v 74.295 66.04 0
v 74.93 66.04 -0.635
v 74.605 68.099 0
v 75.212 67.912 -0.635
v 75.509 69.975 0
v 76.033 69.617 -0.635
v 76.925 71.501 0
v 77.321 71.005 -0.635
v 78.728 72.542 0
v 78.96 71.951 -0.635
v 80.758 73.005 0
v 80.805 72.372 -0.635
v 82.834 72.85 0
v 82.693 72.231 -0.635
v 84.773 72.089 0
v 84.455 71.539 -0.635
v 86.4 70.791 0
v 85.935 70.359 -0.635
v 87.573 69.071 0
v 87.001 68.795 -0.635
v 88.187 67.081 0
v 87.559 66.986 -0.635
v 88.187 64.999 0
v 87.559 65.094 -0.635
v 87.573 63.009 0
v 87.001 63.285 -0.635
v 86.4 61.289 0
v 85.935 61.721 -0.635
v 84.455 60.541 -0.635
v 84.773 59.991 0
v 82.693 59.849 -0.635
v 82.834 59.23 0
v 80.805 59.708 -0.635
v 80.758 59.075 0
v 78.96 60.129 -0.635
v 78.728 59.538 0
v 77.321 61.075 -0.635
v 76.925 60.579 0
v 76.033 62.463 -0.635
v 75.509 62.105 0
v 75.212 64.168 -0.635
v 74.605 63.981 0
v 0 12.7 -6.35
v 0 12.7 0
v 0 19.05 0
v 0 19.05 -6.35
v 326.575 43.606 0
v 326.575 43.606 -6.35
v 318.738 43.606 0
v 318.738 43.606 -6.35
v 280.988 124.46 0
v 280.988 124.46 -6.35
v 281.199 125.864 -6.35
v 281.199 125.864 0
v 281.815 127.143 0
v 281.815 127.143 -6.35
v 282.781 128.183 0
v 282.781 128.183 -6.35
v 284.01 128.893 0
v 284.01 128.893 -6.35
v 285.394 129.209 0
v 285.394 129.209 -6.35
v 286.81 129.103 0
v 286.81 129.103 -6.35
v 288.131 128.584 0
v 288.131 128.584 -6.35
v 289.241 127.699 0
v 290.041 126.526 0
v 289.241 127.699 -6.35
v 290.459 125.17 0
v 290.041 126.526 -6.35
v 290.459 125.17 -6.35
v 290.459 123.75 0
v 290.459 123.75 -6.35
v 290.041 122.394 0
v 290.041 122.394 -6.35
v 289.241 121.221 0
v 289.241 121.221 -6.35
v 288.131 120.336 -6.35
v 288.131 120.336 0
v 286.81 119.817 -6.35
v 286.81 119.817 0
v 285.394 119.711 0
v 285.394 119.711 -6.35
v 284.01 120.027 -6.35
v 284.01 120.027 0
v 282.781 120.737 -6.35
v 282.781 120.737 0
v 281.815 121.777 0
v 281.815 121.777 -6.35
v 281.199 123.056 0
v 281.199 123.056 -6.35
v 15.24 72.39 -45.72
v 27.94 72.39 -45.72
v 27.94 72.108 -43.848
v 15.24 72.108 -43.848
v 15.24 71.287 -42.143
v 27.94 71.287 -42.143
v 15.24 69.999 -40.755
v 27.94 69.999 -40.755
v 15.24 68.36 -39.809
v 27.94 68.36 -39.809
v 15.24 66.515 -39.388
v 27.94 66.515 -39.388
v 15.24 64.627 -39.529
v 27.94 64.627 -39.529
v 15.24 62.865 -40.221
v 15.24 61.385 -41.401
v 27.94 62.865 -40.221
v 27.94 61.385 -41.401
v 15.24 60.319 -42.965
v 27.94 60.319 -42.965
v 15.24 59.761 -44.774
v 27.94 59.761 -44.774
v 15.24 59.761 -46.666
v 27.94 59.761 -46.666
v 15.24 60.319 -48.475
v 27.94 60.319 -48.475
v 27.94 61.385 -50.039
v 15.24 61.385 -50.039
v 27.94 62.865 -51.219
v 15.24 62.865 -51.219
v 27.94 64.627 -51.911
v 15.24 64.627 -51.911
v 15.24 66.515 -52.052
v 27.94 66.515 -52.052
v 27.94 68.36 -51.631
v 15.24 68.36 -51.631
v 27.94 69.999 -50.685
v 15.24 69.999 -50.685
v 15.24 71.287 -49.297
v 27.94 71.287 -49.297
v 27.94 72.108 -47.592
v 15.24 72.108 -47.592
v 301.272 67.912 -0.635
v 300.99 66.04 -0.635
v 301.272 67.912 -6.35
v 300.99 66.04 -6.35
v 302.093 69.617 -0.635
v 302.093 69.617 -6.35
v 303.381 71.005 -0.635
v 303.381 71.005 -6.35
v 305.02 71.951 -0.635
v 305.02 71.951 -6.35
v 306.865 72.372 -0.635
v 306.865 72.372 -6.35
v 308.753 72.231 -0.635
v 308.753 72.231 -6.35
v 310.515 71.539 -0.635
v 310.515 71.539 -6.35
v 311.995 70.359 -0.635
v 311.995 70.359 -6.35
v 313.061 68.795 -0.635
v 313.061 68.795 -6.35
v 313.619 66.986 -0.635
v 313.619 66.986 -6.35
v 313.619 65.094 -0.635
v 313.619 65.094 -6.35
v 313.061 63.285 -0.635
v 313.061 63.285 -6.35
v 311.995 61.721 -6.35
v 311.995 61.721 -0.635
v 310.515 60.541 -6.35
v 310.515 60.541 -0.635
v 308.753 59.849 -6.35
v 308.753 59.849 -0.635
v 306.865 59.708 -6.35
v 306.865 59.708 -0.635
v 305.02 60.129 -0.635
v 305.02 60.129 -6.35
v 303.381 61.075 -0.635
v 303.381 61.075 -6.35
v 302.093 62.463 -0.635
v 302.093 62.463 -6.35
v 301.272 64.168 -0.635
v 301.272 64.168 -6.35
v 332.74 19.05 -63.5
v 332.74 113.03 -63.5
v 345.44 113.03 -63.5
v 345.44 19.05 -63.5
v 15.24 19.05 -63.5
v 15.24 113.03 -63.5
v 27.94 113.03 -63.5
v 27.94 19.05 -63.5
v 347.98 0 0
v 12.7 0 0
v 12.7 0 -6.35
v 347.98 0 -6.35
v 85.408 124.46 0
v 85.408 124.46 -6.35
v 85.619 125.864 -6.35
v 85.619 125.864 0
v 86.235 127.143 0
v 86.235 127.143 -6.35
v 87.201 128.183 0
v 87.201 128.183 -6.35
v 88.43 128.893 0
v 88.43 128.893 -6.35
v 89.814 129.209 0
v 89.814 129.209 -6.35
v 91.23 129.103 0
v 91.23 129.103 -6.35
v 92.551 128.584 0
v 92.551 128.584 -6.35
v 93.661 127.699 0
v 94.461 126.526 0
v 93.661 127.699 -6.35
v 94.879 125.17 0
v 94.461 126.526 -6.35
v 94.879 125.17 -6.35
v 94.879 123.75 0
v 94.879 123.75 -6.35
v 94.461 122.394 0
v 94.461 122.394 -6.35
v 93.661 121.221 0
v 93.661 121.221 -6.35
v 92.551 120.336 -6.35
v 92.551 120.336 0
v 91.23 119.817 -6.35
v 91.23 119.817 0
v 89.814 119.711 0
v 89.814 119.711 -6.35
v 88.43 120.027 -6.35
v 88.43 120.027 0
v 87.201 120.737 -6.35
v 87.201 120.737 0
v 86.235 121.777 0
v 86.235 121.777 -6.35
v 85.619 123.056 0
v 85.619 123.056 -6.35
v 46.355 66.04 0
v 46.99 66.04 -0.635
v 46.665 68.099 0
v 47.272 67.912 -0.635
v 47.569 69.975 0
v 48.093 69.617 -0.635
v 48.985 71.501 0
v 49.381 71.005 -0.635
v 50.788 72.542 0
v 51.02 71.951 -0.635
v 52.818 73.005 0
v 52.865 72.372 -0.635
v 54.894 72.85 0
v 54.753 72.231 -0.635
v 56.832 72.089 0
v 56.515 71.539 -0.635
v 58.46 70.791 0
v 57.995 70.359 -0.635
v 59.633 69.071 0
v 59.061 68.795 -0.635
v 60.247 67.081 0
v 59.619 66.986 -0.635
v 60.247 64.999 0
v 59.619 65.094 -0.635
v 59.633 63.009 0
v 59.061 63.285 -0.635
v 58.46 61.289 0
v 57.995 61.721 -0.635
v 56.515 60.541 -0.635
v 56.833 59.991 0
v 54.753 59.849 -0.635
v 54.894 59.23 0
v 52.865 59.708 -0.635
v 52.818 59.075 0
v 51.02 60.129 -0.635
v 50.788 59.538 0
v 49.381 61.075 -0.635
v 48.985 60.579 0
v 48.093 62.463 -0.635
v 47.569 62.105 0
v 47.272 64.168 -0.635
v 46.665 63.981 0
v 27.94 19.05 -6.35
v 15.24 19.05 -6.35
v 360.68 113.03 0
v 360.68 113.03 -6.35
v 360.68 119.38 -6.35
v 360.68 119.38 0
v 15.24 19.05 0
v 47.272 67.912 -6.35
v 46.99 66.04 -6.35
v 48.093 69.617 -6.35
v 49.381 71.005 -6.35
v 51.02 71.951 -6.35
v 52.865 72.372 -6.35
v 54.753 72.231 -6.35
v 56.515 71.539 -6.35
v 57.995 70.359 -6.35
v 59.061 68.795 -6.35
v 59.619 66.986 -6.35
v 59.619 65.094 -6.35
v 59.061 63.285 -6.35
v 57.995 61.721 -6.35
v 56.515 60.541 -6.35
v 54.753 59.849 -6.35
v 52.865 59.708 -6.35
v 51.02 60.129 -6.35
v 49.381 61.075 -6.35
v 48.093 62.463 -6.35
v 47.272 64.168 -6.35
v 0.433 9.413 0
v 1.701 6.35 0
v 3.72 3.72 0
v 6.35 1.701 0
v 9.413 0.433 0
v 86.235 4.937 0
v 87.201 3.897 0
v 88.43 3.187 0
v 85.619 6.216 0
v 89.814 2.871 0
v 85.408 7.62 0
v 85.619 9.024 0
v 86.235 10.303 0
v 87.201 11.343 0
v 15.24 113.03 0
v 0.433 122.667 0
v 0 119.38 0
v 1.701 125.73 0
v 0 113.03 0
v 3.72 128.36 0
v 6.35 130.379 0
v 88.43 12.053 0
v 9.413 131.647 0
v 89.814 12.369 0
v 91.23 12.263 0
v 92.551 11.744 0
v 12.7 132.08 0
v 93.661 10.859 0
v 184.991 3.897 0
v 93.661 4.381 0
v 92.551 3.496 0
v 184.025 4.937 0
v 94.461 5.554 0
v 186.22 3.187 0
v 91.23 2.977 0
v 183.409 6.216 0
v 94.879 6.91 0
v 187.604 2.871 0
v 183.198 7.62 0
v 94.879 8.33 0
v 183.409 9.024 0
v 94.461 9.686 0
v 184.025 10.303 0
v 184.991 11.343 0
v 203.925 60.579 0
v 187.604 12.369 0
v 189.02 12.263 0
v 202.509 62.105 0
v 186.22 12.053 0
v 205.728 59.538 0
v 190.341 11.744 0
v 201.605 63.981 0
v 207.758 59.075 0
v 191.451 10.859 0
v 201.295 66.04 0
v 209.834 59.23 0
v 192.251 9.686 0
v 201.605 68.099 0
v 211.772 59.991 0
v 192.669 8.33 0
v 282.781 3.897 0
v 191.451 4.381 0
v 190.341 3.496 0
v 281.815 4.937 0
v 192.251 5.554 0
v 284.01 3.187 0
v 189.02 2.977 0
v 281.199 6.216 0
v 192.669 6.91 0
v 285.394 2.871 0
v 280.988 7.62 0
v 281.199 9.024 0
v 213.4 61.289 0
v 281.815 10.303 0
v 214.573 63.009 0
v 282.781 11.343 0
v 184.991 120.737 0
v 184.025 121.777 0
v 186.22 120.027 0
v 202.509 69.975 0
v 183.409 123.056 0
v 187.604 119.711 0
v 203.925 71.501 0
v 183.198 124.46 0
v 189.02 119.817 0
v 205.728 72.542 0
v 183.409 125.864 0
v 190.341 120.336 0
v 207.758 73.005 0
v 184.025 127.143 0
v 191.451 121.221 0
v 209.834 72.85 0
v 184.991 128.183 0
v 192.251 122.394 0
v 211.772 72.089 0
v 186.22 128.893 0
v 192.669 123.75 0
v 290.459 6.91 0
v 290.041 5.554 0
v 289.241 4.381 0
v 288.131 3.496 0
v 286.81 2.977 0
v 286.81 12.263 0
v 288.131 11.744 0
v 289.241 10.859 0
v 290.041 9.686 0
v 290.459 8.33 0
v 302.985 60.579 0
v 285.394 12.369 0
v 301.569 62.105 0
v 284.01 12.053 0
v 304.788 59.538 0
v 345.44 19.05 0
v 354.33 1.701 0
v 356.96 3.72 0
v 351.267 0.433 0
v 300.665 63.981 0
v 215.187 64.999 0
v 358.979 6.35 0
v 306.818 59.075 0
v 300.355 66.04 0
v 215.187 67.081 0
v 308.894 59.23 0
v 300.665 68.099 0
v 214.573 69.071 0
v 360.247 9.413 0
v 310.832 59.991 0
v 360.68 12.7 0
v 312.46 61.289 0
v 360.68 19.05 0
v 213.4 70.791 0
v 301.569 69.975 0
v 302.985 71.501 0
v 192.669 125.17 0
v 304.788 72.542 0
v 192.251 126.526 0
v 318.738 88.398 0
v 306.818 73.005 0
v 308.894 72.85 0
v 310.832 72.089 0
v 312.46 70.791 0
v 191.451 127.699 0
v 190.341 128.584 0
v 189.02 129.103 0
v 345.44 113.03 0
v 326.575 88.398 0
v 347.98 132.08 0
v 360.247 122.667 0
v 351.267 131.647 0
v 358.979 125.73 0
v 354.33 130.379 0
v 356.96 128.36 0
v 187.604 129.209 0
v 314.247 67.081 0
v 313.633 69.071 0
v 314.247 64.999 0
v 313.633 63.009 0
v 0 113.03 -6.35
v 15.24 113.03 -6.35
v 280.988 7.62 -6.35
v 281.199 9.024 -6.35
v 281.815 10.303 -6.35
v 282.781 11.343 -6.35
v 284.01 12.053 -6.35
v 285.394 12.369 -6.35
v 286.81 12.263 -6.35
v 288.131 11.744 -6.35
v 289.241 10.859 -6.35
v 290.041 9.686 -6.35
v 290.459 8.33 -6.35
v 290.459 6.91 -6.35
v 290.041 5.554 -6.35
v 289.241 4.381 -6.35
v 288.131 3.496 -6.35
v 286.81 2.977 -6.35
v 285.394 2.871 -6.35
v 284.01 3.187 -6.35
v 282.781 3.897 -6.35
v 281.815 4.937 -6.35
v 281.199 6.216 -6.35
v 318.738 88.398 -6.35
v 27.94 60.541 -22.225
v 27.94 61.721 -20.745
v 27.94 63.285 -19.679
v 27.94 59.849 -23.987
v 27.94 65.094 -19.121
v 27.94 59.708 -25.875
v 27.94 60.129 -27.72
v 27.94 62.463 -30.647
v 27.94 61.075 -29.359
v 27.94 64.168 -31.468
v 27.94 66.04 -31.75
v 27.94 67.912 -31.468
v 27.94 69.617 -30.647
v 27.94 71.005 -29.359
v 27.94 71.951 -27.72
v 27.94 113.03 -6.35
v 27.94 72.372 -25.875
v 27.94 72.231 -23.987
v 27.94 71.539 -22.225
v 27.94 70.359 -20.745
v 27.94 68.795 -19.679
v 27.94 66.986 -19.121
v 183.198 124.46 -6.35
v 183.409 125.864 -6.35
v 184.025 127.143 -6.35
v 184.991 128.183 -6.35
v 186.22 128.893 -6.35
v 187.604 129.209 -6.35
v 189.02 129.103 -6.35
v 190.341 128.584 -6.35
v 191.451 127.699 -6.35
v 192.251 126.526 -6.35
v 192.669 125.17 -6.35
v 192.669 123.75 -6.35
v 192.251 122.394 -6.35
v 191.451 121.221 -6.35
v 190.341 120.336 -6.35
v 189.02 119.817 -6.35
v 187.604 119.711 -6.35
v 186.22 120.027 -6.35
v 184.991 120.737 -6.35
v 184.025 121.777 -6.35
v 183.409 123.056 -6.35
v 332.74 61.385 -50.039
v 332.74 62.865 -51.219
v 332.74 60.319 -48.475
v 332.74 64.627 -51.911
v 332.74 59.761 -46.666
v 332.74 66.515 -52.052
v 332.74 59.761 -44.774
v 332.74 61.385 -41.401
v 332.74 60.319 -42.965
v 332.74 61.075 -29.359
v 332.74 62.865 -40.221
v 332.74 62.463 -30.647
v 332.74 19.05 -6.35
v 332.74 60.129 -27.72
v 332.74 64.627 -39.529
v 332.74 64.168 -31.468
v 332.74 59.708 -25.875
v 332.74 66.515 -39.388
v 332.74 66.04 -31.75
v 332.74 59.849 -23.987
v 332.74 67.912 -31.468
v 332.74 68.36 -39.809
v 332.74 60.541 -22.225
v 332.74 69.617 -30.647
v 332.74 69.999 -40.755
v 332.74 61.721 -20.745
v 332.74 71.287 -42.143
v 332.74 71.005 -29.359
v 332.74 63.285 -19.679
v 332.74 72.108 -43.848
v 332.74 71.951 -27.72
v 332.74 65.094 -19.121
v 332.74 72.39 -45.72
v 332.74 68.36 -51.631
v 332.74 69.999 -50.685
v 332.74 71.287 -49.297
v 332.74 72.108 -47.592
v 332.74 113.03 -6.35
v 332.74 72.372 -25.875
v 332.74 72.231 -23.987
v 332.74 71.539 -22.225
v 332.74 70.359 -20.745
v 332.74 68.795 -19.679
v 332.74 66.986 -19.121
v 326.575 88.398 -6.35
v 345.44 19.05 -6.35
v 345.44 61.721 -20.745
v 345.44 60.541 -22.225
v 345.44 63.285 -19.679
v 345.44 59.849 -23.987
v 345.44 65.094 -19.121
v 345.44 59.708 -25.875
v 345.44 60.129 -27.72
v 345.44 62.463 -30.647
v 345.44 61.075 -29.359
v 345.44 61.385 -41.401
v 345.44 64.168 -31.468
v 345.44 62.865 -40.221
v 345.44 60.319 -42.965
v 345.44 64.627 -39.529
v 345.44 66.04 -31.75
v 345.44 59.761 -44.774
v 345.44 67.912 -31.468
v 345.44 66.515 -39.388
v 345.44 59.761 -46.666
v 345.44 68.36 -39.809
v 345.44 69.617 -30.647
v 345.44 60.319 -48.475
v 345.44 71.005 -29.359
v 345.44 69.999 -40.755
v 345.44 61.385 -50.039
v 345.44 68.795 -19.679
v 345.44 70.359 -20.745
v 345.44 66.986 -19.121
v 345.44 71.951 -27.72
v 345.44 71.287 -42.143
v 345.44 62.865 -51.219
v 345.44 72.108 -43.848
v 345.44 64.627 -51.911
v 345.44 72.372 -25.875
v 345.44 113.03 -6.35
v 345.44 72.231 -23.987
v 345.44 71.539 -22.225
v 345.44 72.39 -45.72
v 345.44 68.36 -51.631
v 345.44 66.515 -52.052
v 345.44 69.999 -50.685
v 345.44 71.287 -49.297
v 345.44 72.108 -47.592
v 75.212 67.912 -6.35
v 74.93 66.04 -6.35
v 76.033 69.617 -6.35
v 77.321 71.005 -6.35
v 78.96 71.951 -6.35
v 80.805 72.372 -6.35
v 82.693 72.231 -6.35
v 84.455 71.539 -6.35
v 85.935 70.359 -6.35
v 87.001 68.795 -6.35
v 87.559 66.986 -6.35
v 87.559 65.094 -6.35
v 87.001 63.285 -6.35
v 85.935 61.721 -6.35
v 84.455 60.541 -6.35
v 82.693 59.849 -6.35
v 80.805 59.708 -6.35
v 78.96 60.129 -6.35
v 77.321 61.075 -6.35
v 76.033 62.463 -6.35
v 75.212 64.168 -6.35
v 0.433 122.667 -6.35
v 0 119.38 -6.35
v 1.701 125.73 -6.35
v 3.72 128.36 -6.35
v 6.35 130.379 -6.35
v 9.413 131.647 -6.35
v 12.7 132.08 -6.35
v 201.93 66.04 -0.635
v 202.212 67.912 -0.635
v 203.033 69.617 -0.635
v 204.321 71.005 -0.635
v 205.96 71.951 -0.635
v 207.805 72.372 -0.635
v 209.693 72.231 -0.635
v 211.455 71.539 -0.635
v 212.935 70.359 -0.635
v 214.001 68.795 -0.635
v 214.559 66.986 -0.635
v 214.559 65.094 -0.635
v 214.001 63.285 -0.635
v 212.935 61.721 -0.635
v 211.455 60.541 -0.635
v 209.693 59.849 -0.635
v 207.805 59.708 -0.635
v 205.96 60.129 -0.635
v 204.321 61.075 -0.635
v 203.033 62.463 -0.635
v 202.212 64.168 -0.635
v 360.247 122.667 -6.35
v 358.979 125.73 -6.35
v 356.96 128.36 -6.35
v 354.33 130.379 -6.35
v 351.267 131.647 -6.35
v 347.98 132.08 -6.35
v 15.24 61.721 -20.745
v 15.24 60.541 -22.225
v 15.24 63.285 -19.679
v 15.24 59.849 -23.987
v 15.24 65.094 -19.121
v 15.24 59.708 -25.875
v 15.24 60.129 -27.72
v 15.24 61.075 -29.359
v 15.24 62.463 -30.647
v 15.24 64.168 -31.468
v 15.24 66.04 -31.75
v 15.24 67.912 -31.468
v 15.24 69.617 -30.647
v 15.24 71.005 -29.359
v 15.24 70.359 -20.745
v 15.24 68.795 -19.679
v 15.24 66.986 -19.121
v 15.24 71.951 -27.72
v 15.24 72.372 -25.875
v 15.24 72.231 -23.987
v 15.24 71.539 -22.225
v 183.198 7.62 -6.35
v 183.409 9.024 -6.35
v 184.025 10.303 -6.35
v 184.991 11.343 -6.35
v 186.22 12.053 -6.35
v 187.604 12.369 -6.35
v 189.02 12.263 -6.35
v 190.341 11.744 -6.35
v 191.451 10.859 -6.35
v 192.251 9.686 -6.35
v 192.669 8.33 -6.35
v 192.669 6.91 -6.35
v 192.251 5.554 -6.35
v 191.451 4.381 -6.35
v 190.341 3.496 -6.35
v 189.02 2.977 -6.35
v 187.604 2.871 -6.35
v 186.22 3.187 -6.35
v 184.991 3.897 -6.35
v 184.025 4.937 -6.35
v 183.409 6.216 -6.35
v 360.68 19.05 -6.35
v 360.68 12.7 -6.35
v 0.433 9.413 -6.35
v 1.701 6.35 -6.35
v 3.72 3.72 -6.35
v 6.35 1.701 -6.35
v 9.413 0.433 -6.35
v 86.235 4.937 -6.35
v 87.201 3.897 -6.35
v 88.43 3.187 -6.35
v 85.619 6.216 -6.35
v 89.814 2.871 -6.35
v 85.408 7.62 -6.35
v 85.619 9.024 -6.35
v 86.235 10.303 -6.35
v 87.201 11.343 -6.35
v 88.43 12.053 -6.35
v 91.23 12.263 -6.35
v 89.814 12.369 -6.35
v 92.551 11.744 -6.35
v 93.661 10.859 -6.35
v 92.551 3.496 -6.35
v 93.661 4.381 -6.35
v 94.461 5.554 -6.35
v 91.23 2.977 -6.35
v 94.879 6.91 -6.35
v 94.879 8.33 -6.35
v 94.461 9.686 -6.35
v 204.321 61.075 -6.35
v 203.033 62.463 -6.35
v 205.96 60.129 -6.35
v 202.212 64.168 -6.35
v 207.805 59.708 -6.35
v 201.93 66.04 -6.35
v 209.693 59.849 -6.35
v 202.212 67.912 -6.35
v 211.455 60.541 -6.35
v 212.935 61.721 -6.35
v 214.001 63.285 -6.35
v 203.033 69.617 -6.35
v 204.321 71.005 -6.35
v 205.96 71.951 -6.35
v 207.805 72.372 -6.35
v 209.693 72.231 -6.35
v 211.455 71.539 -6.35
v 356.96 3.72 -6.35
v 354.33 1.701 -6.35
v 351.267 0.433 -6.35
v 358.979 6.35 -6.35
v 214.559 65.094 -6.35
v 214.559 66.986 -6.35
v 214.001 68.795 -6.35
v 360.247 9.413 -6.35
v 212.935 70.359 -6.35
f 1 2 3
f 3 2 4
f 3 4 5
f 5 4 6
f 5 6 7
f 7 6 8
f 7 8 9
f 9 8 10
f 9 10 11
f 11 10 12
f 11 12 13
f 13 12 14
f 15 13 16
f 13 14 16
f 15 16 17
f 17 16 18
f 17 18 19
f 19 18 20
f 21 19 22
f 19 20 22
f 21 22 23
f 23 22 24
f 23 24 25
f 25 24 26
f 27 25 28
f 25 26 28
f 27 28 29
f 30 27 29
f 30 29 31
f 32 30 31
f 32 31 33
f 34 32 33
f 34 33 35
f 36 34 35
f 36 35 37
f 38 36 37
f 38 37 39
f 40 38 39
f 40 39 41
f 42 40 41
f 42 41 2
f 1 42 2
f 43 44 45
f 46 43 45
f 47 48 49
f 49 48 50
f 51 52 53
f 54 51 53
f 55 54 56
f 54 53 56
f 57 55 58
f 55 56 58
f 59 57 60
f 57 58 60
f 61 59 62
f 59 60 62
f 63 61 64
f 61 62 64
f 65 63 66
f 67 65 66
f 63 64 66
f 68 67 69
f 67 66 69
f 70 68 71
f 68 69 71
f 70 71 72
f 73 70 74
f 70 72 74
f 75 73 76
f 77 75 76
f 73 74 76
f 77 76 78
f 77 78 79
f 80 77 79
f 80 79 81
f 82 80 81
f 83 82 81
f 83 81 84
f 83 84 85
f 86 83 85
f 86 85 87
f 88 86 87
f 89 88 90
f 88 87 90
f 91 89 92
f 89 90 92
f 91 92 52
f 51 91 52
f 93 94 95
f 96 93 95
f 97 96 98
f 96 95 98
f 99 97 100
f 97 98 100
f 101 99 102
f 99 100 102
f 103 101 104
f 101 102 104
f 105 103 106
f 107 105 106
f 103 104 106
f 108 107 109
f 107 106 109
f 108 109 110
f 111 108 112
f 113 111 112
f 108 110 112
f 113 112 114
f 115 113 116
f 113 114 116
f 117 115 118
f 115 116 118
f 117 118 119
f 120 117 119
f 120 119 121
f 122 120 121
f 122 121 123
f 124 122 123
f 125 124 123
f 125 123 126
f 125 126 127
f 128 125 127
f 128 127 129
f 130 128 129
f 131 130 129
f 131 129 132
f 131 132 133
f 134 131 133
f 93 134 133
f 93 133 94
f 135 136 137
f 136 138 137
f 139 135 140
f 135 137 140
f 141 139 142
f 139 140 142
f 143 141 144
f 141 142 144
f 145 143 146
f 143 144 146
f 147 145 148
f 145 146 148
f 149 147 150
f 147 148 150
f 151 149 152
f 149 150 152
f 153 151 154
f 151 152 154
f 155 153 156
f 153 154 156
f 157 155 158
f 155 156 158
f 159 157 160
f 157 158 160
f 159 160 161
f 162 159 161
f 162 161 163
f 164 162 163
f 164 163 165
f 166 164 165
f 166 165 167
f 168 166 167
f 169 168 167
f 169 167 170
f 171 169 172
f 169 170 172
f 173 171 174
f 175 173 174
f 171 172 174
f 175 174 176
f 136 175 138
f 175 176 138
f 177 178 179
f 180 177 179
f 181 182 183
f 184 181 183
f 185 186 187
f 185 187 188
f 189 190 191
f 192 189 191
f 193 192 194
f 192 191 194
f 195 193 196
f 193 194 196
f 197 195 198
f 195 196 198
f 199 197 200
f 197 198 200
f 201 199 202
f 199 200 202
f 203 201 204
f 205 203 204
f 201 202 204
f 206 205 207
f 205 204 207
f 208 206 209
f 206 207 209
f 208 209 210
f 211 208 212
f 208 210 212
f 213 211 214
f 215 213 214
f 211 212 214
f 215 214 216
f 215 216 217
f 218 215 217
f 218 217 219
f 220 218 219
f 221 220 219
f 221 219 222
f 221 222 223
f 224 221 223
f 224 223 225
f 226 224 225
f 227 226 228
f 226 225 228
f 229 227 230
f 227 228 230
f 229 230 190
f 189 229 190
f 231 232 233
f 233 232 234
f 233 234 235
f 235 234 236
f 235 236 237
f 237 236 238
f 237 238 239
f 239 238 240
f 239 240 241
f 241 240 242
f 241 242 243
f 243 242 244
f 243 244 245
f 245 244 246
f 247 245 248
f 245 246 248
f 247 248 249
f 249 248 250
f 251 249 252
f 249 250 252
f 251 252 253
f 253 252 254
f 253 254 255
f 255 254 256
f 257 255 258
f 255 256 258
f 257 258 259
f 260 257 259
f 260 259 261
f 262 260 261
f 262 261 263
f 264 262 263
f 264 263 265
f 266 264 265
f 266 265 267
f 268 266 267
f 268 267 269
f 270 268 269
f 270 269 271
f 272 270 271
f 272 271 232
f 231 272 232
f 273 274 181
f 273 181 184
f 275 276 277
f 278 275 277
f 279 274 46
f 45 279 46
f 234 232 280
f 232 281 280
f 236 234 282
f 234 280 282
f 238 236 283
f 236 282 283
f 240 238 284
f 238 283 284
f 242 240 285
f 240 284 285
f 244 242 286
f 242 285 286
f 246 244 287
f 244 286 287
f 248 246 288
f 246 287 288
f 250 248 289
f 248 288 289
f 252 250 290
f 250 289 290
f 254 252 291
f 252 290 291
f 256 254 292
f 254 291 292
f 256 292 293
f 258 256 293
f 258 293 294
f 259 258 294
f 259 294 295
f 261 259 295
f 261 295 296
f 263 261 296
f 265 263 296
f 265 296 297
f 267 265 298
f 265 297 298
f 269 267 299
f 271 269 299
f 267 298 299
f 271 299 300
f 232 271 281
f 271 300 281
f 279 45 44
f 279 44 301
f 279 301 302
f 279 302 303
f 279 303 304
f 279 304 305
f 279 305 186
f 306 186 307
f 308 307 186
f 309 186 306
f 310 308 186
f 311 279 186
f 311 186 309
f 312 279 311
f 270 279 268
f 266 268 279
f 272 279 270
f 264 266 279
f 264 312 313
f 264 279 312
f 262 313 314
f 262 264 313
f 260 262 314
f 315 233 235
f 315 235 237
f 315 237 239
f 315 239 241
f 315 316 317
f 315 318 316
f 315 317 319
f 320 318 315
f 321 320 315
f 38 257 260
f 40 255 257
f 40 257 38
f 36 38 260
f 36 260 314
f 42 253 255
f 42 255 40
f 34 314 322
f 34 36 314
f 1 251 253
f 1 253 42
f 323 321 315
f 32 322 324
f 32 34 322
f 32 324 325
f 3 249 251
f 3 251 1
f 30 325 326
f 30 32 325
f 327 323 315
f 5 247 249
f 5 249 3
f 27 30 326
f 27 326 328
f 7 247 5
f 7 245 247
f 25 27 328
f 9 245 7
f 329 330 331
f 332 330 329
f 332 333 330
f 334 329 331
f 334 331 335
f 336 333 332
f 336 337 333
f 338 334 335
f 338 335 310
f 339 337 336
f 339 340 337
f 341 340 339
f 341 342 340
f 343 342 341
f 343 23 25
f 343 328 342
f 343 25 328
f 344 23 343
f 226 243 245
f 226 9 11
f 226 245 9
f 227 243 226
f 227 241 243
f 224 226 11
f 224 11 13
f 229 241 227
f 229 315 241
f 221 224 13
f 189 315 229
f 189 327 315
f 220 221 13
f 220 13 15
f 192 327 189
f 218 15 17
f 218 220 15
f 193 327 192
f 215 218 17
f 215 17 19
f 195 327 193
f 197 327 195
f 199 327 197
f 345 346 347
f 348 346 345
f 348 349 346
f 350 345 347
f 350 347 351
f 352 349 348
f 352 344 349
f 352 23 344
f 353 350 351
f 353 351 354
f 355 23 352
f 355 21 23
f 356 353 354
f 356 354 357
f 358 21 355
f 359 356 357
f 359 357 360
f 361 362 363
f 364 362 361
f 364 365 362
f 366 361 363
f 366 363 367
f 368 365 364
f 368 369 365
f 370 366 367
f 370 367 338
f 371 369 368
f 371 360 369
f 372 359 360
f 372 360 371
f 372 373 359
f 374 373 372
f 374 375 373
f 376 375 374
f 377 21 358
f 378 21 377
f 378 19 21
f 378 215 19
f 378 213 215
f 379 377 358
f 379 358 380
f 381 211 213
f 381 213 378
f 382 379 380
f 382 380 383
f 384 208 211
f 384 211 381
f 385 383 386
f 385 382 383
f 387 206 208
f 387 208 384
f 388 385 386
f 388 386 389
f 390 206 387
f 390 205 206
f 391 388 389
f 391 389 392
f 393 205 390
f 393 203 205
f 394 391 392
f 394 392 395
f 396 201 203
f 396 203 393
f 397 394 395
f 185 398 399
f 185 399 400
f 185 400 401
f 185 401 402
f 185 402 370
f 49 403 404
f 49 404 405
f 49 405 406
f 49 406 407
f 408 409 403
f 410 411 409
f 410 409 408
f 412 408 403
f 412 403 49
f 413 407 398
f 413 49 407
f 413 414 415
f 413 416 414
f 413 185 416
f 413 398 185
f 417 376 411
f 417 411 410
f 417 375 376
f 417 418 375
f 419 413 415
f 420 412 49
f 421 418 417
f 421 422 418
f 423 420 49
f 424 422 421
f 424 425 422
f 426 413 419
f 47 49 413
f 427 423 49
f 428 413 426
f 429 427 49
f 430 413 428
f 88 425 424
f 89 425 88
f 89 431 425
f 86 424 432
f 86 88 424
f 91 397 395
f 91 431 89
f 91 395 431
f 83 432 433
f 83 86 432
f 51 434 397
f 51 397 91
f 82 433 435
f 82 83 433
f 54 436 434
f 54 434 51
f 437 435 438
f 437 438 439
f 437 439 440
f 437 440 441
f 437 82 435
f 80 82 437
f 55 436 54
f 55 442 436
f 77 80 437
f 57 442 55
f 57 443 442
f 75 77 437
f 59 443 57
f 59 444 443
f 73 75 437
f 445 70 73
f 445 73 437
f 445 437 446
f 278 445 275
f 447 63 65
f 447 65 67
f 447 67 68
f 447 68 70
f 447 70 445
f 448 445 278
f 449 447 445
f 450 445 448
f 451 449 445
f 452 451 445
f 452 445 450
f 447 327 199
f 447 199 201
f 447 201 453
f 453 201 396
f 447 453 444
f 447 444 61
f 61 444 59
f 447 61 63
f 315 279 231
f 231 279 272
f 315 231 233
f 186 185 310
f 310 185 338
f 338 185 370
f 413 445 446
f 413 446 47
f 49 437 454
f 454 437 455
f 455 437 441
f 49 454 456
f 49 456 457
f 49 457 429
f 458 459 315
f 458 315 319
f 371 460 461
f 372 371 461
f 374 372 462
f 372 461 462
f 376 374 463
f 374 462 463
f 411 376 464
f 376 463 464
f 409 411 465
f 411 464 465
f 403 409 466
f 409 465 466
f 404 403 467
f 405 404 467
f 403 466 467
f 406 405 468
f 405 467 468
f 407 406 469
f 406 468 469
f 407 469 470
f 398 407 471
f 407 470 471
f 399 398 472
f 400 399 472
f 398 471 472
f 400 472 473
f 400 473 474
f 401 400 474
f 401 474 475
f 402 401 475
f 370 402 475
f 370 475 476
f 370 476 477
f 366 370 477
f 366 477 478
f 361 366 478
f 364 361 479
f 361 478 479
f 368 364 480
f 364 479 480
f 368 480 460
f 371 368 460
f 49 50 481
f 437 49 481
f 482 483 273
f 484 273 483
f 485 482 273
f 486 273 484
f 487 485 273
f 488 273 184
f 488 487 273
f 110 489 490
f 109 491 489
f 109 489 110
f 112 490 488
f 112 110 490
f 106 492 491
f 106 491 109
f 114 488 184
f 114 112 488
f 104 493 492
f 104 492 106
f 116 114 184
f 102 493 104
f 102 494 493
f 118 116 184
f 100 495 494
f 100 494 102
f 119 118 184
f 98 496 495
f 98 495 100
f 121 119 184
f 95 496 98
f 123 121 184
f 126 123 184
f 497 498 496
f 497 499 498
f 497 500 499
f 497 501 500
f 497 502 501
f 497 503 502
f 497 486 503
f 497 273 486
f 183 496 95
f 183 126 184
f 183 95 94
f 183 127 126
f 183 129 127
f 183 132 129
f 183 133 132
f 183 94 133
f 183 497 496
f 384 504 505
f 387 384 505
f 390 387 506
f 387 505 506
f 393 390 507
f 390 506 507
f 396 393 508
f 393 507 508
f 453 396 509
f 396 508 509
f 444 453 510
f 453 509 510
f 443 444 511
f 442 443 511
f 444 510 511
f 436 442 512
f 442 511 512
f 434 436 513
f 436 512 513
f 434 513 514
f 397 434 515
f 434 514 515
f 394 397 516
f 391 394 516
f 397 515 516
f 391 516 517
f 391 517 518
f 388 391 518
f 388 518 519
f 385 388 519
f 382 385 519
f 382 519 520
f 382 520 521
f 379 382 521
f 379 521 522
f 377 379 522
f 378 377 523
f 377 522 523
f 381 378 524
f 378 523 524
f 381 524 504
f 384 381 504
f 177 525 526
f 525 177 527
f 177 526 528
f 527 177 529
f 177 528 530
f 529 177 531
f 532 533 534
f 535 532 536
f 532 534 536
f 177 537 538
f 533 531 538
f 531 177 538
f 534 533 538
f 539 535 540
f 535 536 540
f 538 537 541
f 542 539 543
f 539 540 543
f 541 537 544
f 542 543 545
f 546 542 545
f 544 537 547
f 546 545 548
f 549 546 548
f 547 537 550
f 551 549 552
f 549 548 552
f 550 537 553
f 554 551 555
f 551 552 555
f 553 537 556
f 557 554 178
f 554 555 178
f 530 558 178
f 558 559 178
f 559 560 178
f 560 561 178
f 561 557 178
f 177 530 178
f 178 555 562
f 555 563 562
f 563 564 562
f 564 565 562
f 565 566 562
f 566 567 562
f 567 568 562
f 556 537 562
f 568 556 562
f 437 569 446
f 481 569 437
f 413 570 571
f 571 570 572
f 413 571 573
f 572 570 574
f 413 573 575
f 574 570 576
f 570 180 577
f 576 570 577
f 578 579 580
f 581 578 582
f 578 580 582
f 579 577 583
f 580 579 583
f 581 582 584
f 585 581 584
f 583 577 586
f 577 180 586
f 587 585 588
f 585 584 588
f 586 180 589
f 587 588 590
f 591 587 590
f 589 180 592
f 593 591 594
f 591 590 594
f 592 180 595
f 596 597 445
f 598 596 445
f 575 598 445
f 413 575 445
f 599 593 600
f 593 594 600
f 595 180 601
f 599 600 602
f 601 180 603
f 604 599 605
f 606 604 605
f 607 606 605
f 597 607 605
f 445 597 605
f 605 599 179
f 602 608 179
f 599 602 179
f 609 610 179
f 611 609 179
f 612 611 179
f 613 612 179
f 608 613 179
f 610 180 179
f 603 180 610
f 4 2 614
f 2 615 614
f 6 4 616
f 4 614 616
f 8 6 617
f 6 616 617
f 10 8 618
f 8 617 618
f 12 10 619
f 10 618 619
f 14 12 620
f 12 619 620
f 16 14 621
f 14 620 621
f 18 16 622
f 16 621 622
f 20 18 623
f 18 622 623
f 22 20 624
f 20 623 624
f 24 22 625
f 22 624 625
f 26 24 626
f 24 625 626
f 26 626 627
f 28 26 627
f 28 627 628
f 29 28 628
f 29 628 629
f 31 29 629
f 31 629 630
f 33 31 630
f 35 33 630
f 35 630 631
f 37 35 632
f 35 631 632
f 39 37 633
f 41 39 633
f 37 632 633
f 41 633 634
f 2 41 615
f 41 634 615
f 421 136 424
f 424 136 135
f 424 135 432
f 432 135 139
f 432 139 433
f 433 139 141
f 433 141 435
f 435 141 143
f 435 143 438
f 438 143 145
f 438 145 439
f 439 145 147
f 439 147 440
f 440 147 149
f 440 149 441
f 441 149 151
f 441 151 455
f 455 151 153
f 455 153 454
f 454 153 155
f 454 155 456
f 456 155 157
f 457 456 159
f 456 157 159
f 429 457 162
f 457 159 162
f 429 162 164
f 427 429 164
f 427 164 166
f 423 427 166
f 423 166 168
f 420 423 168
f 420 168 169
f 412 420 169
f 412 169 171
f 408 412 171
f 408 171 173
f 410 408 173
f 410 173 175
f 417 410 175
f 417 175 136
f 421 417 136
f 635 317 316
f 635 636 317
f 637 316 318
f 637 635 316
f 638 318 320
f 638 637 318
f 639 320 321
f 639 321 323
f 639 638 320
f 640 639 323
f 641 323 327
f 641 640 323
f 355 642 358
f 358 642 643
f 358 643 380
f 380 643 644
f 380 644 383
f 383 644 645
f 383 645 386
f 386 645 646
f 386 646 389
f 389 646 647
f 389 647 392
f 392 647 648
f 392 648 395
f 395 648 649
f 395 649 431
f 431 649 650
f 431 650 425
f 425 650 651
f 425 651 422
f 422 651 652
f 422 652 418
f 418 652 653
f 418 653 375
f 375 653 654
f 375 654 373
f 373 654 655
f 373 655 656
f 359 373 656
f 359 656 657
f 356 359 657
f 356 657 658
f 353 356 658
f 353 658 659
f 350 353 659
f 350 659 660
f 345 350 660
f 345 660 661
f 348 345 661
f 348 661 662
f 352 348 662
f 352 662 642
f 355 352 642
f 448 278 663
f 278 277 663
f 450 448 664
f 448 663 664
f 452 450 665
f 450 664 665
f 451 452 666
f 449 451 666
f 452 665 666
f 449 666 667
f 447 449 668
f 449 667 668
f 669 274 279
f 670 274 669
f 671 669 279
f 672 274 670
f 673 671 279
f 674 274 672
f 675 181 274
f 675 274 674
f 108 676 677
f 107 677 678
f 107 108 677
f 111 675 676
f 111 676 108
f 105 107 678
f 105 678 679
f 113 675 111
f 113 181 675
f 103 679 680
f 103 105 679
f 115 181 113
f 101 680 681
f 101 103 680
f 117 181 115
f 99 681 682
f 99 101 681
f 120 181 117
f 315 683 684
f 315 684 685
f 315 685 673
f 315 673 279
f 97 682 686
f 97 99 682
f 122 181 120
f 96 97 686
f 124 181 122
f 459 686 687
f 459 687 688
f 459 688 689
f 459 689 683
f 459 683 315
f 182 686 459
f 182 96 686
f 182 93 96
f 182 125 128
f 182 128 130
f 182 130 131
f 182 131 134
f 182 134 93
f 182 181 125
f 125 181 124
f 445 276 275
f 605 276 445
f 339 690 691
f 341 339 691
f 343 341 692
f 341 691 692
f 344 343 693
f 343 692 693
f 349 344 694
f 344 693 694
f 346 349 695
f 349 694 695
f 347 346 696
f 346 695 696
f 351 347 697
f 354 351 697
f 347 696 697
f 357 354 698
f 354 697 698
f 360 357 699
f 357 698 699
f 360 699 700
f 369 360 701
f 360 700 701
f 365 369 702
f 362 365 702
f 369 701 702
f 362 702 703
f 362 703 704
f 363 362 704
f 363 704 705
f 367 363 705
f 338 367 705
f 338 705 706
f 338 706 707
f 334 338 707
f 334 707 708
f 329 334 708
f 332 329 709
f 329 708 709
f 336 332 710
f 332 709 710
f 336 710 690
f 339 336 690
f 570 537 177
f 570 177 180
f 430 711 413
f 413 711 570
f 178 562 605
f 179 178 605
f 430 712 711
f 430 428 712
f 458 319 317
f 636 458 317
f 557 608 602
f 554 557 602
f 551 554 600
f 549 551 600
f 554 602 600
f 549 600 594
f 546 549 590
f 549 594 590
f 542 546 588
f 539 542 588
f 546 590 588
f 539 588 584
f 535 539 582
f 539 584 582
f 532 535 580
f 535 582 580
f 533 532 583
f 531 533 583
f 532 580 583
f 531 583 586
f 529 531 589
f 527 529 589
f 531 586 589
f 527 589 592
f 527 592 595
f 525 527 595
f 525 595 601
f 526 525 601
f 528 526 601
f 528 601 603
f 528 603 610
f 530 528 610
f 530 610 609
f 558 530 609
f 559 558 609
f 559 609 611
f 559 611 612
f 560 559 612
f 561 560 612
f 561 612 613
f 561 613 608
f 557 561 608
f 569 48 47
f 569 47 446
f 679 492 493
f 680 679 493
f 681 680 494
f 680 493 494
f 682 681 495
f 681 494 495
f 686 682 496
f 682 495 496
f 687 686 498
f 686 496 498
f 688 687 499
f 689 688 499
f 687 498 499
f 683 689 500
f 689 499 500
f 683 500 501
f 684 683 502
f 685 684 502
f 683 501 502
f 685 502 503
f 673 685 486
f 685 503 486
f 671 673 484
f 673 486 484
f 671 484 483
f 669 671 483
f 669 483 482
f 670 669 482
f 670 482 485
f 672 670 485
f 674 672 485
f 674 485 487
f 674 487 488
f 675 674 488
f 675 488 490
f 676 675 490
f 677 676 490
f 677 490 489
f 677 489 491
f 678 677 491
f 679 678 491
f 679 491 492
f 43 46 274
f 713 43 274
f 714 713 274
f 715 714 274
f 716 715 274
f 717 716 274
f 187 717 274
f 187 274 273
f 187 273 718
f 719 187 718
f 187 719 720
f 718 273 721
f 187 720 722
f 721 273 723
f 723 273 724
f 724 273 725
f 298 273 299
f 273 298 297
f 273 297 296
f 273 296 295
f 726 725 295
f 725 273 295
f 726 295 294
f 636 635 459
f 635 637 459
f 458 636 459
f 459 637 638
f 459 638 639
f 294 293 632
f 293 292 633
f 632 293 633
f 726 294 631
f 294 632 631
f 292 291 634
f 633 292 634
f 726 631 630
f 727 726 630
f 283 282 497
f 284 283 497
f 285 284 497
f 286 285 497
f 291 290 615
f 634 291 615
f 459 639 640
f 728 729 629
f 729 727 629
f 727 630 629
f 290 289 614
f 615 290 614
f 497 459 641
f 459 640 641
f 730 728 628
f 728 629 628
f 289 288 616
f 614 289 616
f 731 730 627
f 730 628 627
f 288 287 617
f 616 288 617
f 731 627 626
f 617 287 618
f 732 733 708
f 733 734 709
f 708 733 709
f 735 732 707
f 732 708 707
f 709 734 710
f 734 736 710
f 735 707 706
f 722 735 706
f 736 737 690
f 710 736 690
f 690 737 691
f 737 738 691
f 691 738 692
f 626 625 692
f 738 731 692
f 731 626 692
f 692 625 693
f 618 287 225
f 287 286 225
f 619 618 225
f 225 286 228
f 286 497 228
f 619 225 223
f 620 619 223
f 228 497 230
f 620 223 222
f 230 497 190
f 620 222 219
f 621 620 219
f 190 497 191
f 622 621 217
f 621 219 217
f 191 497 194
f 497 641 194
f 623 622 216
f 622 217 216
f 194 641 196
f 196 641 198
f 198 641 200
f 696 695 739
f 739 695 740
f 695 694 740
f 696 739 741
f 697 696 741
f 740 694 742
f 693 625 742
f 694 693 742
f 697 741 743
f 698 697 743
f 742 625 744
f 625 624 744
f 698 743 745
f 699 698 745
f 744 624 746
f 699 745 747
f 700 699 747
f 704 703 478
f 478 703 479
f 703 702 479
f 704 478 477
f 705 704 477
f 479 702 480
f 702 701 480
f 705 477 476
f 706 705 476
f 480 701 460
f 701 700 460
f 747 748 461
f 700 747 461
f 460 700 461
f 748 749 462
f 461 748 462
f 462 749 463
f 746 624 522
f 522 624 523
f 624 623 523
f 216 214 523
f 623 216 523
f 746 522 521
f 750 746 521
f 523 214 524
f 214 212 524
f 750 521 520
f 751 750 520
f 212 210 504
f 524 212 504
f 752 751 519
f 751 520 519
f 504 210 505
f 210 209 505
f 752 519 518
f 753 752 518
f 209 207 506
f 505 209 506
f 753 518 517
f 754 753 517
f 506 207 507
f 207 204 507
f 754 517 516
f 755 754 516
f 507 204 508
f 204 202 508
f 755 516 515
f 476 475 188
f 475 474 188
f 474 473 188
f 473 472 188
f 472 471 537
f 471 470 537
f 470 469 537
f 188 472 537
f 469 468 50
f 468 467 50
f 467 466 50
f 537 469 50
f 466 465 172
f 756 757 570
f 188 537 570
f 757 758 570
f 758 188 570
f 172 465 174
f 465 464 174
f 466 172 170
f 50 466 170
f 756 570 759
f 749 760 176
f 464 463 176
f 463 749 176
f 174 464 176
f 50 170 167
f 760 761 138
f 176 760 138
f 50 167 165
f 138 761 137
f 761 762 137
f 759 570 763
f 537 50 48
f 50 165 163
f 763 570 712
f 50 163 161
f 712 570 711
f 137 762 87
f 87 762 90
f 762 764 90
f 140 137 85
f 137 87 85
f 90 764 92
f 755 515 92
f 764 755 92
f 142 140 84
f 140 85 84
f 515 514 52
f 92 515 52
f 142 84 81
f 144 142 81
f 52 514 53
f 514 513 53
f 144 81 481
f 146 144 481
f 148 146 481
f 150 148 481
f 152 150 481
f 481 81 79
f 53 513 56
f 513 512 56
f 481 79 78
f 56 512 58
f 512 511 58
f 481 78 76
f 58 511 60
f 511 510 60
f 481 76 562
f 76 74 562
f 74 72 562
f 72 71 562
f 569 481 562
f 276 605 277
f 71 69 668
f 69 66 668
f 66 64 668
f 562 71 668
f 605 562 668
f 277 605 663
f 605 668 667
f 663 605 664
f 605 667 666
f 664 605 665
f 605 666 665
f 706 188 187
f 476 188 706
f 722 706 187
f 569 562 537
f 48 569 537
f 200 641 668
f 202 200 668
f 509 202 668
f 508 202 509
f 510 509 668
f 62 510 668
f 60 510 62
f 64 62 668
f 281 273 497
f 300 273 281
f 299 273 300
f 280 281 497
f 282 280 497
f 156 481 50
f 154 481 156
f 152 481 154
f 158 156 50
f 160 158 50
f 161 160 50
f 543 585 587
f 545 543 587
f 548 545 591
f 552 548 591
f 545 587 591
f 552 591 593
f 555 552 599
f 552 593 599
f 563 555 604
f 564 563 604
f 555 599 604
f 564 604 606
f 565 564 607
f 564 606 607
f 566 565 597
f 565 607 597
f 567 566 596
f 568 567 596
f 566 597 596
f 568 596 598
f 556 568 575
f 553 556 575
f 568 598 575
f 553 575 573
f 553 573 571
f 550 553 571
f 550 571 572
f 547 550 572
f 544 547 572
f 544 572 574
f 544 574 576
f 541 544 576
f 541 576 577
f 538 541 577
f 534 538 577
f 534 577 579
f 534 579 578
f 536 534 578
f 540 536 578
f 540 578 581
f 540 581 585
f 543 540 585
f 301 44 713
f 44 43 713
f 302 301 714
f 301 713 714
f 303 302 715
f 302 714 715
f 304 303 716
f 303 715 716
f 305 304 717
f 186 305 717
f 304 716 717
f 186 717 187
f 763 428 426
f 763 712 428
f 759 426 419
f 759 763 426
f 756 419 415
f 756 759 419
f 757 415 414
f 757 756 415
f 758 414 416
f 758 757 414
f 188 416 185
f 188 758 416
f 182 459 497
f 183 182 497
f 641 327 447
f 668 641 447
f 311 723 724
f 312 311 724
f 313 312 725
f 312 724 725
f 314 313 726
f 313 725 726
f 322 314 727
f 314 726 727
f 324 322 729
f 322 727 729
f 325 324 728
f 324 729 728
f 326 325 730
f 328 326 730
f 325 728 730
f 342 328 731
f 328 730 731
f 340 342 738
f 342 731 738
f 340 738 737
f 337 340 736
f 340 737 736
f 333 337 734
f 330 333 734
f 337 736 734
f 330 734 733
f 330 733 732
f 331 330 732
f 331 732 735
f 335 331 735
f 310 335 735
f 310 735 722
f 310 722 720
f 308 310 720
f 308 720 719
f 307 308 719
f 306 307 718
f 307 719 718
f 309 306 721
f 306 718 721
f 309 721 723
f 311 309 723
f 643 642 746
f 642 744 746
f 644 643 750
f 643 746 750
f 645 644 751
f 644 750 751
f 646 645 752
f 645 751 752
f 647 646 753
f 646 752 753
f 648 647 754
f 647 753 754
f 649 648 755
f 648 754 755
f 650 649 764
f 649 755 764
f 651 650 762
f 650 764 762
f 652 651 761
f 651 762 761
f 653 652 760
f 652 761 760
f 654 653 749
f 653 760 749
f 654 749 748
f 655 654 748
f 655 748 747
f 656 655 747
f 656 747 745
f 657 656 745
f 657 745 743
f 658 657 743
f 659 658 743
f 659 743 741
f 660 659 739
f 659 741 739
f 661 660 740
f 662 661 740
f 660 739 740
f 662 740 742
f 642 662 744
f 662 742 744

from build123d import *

# Parameters (mm, degrees)
SKETCH1_4_W                            = 360.68
SKETCH1_4_H                            = 132.08
SKETCH1_4_W_2                          = 27.94
SKETCH1_4_H_2                          = 93.98
BOSS_EXTRUDE3_DEPTH                    = 6.35
F_3_8_0_375_DIAMETER_HOLE1_D           = 9.525
F_3_8_0_375_DIAMETER_HOLE1_DEPTH       = 12.7
F_3_8_0_375_DIAMETER_HOLE1_CSINK_D     = 10.795
F_3_8_0_375_DIAMETER_HOLE1_CSINK_ANGLE = 90
F_3_8_0_375_DIAMETER_HOLE1_TIP         = 2.861598698
FILLET1_R                              = 12.7
SKETCH1_W                              = 27.94
SKETCH1_H                              = 93.98
BOSS_EXTRUDE4_DEPTH                    = 63.5
SKETCH10_R                             = 10.16
SKETCH10_R_2                           = 6.35
CUT_EXTRUDE11_DEPTH                    = 386.08
FILLET5_R                              = 6.35
F_1_2_0_5_DIAMETER_HOLE1_D             = 12.7
F_1_2_0_5_DIAMETER_HOLE1_DEPTH         = 13.97
F_1_2_0_5_DIAMETER_HOLE1_CSINK_D       = 13.97
F_1_2_0_5_DIAMETER_HOLE1_CSINK_ANGLE   = 90
F_1_2_0_5_DIAMETER_HOLE1_TIP           = 3.815464931
THREAD15_PITCH                         = 2.116666667
THREAD15_HEIGHT                        = 10
THREAD15_RADIUS                        = 10.16
THREAD15_START_ANGLE                   = -180
SKETCH25_W                             = 7.837170734
SKETCH25_H                             = 44.791396978
CUT_EXTRUDE12_DEPTH                    = 36.068
THREAD16_PITCH                         = 2.116666667
THREAD16_HEIGHT                        = 10
THREAD16_RADIUS                        = 10.16
THREAD16_START_ANGLE                   = -180
BOSS_EXTRUDE6_START                    = -15.24
SKETCH28_R                             = 10.16
BOSS_EXTRUDE6_DEPTH                    = 15.24
SKETCH29_R                             = 10.16
BOSS_EXTRUDE7_DEPTH                    = 15.24
SKETCH30_W                             = 15.24
SKETCH30_H                             = 93.98
CUT_EXTRUDE13_DEPTH                    = 57.15
SKETCH30_2_W                           = 15.24
SKETCH30_2_H                           = 93.98
CUT_EXTRUDE15_DEPTH                    = 139.954
SKETCH33_R                             = 6.35
CUT_EXTRUDE16_DEPTH                    = 343.916


with BuildPart() as part:
    # Sketch1<4> → Boss-Extrude3 (new body)
    with BuildSketch(Plane.XY):
        with Locations((180.34, 66.04)):
            Rectangle(SKETCH1_4_W, SKETCH1_4_H)
        with Locations((346.71, 66.04)):
            Rectangle(SKETCH1_4_W_2, SKETCH1_4_H_2)
    extrude(amount=-BOSS_EXTRUDE3_DEPTH)

    # 3/8 (0.375) Diameter Hole1
    with Locations(Plane.XY.offset(6.35)):
        with Locations((187.96, 124.46), (285.75, 124.46), (90.17, 124.46), (90.17, 7.62), (187.96, 7.62), (285.75, 7.62)):
            CounterSinkHole(F_3_8_0_375_DIAMETER_HOLE1_D / 2, F_3_8_0_375_DIAMETER_HOLE1_CSINK_D / 2, depth=F_3_8_0_375_DIAMETER_HOLE1_DEPTH, counter_sink_angle=F_3_8_0_375_DIAMETER_HOLE1_CSINK_ANGLE)
            with Locations((0, 0, -(F_3_8_0_375_DIAMETER_HOLE1_DEPTH + F_3_8_0_375_DIAMETER_HOLE1_TIP / 2))):  # 118° drill point
                Cone(0, F_3_8_0_375_DIAMETER_HOLE1_D / 2, F_3_8_0_375_DIAMETER_HOLE1_TIP, mode=Mode.SUBTRACT)

    # Fillet1
    fillet1_edges = [part.edges().sort_by_distance(p)[0] for p in [
        (0, 0, -3.175),
        (0, 132.08, -3.175),
        (360.68, 132.08, -3.175),
        (360.68, 0, -3.175),
    ]]
    fillet(fillet1_edges, radius=FILLET1_R)

    # Sketch1 → Boss-Extrude4 (add)
    with BuildSketch(Plane.XY):
        with Locations((346.71, 66.04)):
            Rectangle(SKETCH1_W, SKETCH1_H)
        with Locations((13.97, 66.04)):
            Rectangle(SKETCH1_W, SKETCH1_H)
    extrude(amount=-BOSS_EXTRUDE4_DEPTH)

    # Sketch10 → Cut-Extrude11 (cut)
    with BuildSketch(Plane(origin=(360.68, 0, 0), x_dir=(0, 0, -1), z_dir=(1, 0, 0))):
        with Locations((45.72, 66.04)):
            Circle(SKETCH10_R)
        with Locations((25.4, 66.04)):
            Circle(SKETCH10_R_2)
    extrude(amount=-CUT_EXTRUDE11_DEPTH, mode=Mode.SUBTRACT)

    # Fillet5
    fillet5_edges = [part.edges().sort_by_distance(p)[0] for p in [
        (360.68, 113.03, -34.925),
        (360.68, 66.04, -63.5),
        (360.68, 19.05, -34.925),
        (0, 113.03, -34.925),
        (0, 19.05, -34.925),
        (0, 66.04, -63.5),
    ]]
    fillet(fillet5_edges, radius=FILLET5_R)

    # 1/2 (0.5) Diameter Hole1
    with Locations(Plane.XY):
        with Locations((208.28, 66.04), (81.28, 66.04), (53.34, 66.04), (307.34, 66.04)):
            CounterSinkHole(F_1_2_0_5_DIAMETER_HOLE1_D / 2, F_1_2_0_5_DIAMETER_HOLE1_CSINK_D / 2, depth=F_1_2_0_5_DIAMETER_HOLE1_DEPTH, counter_sink_angle=F_1_2_0_5_DIAMETER_HOLE1_CSINK_ANGLE)
            with Locations((0, 0, -(F_1_2_0_5_DIAMETER_HOLE1_DEPTH + F_1_2_0_5_DIAMETER_HOLE1_TIP / 2))):  # 118° drill point
                Cone(0, F_1_2_0_5_DIAMETER_HOLE1_D / 2, F_1_2_0_5_DIAMETER_HOLE1_TIP, mode=Mode.SUBTRACT)

    # Thread15: sweep along a helix
    with BuildLine() as thread15_path:
        add(Helix(THREAD15_PITCH, THREAD15_HEIGHT, THREAD15_RADIUS, center=(360.68, 66.04, -45.72), direction=(-1, 0, 0), mode=Mode.PRIVATE).rotate(Axis((360.68, 66.04, -45.72), (-1, 0, 0)), THREAD15_START_ANGLE))
    # Thread Profile13 → Thread15 (sweep)
    with BuildSketch(Plane(origin=(360.68, 66.04, -35.56), x_dir=(0, 0, 1), z_dir=(0, -1, 0))):
        Polygon((0, 0), (0, 1.852083328), (-1.145679435, 1.190624997), (-1.145679435, 0.66145833), align=None)
    sweep(path=thread15_path.line, is_frenet=True)

    # Sketch25 → Cut-Extrude12 (cut)
    with BuildSketch(Plane(origin=(0, 0, -6.35), x_dir=(-1, 0, 0), z_dir=(0, 0, -1))):
        with Locations((-322.656094919, 66.002101848)):
            Rectangle(SKETCH25_W, SKETCH25_H)
    extrude(amount=-CUT_EXTRUDE12_DEPTH, mode=Mode.SUBTRACT)

    # Thread16: sweep along a helix
    with BuildLine() as thread16_path:
        add(Helix(THREAD16_PITCH, THREAD16_HEIGHT, THREAD16_RADIUS, center=(0, 66.04, -45.72), direction=(1, 0, 0), mode=Mode.PRIVATE).rotate(Axis((0, 66.04, -45.72), (1, 0, 0)), THREAD16_START_ANGLE))
    # Thread Profile14 → Thread16 (sweep, cut)
    with BuildSketch(Plane(origin=(0, 66.04, -55.88), x_dir=(0, 0, -1), z_dir=(0, -1, 0))):
        Polygon((0, 0), (0, 1.852083328), (-1.145679435, 1.190624997), (-1.145679435, 0.66145833), align=None)
    sweep(path=thread16_path.line, is_frenet=True, mode=Mode.SUBTRACT)

    # Sketch28 → Boss-Extrude6 (add)
    with BuildSketch(Plane.ZY.offset(-332.74).offset(BOSS_EXTRUDE6_START)):
        with Locations((-45.72, 66.04)):
            Circle(SKETCH28_R)
    extrude(amount=BOSS_EXTRUDE6_DEPTH)

    # Sketch29 → Boss-Extrude7 (add)
    with BuildSketch(Plane(origin=(27.94, 0, 0), x_dir=(0, 0, -1), z_dir=(1, 0, 0))):
        with Locations((45.72, 66.04)):
            Circle(SKETCH29_R)
    extrude(amount=-BOSS_EXTRUDE7_DEPTH)

    # Sketch30 → Cut-Extrude13 (cut)
    with BuildSketch(Plane(origin=(0, 0, -63.5), x_dir=(-1, 0, 0), z_dir=(0, 0, -1))):
        with Locations((-353.06, 66.04)):
            Rectangle(SKETCH30_W, SKETCH30_H)
        with Locations((-7.62, 66.04)):
            Rectangle(SKETCH30_W, SKETCH30_H)
    extrude(amount=-CUT_EXTRUDE13_DEPTH, mode=Mode.SUBTRACT)

    # Sketch30<2> → Cut-Extrude15 (cut)
    with BuildSketch(Plane(origin=(0, 0, -63.5), x_dir=(-1, 0, 0), z_dir=(0, 0, -1))):
        with Locations((-353.06, 66.04)):
            Rectangle(SKETCH30_2_W, SKETCH30_2_H)
        with Locations((-7.62, 66.04)):
            Rectangle(SKETCH30_2_W, SKETCH30_2_H)
    extrude(amount=-CUT_EXTRUDE15_DEPTH, mode=Mode.SUBTRACT)

    # Sketch33 → Cut-Extrude16 (cut)
    with BuildSketch(Plane(origin=(345.44, 0, 0), x_dir=(0, 0, -1), z_dir=(1, 0, 0))):
        with Locations(Location((45.72, 66.04, 0), (0, 0, 90))):
            Circle(SKETCH33_R)
    extrude(amount=-CUT_EXTRUDE16_DEPTH, mode=Mode.SUBTRACT)


solid = part.part
